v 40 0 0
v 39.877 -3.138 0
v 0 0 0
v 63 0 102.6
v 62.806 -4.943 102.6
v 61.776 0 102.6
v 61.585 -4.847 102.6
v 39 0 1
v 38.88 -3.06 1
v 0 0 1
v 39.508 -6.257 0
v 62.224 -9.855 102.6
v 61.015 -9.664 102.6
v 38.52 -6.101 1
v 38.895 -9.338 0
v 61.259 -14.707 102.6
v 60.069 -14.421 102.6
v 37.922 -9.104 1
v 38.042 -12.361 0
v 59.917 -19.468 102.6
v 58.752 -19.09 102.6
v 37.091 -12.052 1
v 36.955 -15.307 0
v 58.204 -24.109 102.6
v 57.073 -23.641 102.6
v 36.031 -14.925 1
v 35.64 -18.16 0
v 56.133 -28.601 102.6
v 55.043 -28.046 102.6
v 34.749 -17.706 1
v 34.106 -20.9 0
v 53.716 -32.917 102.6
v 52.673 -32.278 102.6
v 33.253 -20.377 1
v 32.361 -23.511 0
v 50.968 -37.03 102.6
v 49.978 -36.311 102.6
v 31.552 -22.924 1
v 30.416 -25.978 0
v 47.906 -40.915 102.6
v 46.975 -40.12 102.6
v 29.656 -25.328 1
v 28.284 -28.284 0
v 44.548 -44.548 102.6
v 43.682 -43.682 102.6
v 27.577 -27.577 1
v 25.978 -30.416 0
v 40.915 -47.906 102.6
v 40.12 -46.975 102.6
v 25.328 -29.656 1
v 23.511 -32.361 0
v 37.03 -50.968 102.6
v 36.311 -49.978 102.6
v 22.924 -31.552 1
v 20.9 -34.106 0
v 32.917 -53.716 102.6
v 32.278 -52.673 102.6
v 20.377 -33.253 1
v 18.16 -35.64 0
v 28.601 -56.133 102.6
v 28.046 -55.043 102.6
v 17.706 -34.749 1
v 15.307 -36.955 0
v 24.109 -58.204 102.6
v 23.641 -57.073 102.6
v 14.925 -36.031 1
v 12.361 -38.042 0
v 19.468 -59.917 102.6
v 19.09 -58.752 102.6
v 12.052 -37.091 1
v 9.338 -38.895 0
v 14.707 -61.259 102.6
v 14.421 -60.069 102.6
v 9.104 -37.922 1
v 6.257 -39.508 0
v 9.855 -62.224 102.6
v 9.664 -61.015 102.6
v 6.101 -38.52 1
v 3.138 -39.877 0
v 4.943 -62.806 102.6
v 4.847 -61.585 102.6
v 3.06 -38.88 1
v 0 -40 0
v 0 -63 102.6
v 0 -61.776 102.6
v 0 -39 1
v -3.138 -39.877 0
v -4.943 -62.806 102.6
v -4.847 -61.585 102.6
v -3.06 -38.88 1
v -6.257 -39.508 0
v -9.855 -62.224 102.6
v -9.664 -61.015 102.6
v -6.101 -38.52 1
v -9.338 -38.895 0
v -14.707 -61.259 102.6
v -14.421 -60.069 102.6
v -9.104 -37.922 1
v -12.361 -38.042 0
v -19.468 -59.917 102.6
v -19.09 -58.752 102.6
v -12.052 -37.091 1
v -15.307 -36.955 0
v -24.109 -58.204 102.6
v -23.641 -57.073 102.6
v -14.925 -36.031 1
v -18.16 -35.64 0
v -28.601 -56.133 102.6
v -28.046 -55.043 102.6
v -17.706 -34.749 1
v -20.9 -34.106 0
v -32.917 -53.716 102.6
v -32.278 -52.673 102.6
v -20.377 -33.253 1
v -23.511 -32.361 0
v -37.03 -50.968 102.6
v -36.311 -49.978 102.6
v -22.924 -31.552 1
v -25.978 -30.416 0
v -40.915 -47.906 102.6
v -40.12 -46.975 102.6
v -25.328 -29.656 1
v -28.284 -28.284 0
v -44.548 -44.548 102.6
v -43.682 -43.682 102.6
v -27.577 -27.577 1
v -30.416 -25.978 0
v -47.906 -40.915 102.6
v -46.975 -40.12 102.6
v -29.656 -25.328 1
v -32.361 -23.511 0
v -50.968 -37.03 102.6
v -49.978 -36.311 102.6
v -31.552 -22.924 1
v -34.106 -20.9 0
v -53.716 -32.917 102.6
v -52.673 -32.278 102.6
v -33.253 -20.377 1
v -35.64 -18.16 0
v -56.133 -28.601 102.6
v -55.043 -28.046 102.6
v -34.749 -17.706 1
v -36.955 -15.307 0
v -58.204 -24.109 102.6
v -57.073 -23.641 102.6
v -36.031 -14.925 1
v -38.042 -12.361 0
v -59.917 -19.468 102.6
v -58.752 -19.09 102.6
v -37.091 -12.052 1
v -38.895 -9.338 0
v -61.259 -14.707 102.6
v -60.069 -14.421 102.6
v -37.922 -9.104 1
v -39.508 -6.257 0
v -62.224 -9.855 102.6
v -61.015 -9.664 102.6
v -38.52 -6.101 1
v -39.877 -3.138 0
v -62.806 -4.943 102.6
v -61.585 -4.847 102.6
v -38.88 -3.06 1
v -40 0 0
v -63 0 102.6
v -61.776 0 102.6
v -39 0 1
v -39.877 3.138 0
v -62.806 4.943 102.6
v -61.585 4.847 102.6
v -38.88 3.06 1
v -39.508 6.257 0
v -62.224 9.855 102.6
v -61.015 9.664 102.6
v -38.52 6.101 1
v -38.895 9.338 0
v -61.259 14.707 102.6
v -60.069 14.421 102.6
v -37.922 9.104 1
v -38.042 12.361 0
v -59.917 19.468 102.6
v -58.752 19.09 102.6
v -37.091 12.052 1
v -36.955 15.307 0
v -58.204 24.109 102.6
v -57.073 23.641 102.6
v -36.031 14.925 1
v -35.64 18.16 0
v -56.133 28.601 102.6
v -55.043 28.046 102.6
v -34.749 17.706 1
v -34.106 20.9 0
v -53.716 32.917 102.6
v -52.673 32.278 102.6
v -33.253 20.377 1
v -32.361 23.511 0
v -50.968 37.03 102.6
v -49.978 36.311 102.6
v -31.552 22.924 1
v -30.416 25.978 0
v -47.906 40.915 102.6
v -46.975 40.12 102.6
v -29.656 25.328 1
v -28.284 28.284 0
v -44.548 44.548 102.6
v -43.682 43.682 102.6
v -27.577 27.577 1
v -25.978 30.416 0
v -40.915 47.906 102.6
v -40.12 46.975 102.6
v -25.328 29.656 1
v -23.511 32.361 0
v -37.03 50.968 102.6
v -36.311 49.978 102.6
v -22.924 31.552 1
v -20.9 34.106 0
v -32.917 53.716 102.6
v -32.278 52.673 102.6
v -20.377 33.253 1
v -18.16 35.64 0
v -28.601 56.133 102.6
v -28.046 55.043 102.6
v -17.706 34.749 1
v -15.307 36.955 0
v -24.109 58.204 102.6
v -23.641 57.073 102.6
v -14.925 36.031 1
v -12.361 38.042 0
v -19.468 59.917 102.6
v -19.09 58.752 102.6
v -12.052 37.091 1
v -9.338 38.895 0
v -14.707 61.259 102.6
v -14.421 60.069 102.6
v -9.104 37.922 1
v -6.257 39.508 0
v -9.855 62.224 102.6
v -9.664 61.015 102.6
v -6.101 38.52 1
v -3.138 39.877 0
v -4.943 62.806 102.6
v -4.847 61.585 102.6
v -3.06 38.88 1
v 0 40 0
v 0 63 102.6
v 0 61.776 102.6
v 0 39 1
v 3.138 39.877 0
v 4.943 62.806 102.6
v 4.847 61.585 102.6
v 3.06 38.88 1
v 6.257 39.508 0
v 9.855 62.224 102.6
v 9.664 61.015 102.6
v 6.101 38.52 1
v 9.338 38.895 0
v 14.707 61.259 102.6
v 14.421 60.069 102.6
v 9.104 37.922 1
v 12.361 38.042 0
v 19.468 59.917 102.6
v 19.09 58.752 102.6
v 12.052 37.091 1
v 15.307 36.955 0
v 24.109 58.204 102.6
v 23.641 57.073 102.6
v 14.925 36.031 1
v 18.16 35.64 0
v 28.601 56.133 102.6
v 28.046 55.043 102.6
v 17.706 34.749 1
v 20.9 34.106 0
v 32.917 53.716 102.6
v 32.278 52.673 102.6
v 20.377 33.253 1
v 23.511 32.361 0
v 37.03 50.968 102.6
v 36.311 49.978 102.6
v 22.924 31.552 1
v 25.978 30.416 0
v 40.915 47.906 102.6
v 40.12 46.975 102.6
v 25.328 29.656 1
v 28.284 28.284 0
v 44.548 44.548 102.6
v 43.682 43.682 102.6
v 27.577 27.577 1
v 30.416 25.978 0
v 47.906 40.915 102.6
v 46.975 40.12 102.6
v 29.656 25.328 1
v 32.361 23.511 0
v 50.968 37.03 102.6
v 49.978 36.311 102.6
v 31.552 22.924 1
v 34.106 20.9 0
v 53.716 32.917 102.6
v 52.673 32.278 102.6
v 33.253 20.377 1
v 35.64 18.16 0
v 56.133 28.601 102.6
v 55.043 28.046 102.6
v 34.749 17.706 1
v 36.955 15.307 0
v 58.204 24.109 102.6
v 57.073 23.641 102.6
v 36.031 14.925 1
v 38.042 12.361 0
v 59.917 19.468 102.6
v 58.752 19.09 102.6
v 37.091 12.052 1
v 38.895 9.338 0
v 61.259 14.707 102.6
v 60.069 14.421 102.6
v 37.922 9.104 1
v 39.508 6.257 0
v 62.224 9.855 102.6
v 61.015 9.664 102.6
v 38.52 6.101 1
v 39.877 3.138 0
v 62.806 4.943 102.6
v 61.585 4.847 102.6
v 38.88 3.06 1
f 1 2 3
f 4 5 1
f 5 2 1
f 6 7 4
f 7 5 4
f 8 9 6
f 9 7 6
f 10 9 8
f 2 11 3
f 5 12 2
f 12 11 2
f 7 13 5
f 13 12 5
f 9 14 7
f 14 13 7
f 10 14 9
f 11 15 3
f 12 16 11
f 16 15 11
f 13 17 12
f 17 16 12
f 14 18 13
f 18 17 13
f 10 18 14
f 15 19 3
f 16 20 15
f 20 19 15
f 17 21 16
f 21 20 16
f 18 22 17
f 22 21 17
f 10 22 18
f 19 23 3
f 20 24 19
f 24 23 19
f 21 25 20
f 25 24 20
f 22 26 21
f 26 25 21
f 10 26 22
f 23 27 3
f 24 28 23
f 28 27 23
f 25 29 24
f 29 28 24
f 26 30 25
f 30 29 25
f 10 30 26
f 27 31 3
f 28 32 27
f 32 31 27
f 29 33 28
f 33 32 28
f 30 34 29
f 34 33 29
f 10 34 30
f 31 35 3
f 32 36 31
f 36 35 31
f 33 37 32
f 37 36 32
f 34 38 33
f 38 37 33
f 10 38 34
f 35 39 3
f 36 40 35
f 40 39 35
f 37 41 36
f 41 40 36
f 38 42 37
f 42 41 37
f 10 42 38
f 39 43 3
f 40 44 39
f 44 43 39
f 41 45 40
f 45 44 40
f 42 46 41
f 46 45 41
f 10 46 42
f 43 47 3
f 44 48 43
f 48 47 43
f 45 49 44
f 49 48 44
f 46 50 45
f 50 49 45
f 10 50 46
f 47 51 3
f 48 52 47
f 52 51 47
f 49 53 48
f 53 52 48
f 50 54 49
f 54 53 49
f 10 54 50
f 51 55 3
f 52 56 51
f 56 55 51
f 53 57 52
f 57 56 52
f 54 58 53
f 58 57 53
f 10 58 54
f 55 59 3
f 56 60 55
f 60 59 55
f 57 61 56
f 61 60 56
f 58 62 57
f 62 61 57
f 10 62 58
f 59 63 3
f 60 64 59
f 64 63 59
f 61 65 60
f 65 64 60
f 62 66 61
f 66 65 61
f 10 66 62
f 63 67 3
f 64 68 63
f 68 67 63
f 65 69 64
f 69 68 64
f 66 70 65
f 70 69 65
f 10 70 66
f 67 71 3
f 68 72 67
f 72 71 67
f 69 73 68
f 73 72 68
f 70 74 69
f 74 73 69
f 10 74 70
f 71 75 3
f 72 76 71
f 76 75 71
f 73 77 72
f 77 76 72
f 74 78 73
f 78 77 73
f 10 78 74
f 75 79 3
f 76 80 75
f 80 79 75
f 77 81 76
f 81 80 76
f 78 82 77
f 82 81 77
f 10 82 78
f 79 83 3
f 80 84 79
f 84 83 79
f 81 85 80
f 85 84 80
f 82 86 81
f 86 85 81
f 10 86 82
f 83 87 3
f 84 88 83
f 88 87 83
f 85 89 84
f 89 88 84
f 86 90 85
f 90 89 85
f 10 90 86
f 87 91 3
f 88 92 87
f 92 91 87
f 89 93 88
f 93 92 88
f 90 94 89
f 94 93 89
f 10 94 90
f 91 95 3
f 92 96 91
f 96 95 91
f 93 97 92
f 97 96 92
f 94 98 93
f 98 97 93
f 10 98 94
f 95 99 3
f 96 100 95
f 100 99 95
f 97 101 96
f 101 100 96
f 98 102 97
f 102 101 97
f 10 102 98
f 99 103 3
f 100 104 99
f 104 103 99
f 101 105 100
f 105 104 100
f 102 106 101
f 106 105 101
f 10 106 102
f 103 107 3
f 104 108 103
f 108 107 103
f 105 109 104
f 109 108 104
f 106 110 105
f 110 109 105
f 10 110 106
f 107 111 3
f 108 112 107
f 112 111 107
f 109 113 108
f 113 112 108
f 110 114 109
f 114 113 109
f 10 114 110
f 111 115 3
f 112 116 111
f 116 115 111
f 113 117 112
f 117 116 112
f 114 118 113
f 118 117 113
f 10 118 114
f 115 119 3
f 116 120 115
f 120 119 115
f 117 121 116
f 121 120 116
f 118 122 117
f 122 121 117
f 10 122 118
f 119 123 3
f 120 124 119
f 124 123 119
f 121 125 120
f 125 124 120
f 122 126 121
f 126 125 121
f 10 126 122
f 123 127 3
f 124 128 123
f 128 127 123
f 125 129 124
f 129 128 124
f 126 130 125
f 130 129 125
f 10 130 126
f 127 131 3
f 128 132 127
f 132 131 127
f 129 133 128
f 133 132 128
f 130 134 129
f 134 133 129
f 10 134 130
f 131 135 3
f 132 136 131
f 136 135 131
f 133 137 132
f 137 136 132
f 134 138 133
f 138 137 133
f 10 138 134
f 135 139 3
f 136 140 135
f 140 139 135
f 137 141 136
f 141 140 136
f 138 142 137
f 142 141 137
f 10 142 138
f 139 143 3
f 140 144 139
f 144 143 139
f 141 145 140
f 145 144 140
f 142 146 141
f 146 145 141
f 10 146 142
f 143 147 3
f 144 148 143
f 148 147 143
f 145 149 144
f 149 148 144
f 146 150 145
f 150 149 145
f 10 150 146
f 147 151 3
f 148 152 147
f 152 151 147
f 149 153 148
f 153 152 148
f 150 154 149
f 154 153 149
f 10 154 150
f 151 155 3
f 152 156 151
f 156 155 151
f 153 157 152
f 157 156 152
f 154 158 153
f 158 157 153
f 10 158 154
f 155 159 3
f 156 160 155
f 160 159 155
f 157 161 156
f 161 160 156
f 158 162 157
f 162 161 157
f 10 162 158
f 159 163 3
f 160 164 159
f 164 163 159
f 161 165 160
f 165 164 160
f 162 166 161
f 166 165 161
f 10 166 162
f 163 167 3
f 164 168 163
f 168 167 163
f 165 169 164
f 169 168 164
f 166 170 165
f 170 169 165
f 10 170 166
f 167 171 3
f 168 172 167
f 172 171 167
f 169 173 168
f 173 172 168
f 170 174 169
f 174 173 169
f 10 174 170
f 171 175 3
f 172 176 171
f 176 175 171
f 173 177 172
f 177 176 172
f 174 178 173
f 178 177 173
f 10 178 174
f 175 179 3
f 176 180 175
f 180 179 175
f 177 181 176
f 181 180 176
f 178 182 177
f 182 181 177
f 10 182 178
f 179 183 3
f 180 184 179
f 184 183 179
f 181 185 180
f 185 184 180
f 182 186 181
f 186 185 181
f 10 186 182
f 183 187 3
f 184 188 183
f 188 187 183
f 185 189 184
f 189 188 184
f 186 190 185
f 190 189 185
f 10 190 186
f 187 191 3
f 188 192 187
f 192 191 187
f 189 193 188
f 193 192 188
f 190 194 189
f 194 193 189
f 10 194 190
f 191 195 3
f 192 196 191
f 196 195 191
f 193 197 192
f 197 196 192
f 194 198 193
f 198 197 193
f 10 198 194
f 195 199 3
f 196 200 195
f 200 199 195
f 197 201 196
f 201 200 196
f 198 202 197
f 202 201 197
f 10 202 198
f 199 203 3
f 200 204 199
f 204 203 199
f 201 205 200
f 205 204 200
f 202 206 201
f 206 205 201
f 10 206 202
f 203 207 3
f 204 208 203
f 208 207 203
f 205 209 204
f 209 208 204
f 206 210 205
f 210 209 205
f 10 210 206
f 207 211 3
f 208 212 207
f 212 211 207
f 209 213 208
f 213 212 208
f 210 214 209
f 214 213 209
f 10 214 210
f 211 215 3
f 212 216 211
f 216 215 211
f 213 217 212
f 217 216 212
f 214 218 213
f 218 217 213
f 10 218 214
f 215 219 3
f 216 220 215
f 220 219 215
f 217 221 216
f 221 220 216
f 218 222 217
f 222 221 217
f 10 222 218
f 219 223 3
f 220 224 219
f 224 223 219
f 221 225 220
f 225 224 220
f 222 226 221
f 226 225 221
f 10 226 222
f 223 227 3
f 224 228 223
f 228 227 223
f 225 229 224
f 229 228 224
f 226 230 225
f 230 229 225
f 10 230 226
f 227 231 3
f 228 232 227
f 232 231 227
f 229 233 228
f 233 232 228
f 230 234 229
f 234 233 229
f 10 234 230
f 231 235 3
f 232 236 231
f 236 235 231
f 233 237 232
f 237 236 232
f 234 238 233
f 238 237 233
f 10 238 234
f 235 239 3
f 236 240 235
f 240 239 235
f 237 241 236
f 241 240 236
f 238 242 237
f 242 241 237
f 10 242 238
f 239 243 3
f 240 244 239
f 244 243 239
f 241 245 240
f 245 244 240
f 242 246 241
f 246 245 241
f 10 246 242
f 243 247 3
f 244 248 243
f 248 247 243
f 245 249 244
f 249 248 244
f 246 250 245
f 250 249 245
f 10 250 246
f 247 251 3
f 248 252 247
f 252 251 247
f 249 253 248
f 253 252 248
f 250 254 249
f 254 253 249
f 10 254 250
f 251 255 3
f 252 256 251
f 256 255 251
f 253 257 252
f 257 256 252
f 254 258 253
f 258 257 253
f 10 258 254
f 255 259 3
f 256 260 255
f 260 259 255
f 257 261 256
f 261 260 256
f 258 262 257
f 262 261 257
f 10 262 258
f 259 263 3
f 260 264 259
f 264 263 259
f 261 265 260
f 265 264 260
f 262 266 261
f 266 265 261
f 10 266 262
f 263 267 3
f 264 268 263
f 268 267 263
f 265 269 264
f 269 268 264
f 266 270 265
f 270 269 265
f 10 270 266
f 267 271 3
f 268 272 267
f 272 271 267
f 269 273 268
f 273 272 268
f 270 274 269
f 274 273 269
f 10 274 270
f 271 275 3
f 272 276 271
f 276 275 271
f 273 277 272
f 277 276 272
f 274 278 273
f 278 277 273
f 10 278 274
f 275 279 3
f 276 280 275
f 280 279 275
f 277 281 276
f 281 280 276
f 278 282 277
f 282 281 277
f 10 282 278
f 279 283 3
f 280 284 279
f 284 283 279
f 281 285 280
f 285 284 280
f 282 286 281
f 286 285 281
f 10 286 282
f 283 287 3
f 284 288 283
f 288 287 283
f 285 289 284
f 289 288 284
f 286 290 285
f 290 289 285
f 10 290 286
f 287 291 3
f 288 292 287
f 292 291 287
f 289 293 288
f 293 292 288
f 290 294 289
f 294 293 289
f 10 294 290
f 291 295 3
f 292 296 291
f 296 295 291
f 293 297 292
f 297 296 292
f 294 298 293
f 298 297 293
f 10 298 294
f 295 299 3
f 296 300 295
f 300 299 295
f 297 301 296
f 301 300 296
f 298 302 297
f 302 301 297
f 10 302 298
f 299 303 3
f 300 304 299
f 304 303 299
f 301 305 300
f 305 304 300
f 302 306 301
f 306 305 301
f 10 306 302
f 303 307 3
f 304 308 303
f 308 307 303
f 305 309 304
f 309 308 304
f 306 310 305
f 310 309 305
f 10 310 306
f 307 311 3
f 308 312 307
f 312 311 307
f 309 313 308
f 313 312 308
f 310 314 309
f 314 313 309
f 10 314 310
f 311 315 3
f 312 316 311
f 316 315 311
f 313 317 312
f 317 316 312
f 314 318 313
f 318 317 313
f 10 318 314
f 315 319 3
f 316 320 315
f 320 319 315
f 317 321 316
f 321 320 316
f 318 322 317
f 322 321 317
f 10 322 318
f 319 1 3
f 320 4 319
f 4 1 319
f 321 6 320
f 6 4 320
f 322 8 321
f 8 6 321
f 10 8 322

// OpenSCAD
$fn=80;

rotate_extrude(angle=360,convexity=10) {
rotate([0,0,90])
difference() {
polygon(points=[[0,0],[0,40],[102.6,63],[102.6,0]])    ;
translate([1,0])
polygon(points=[[0,0],[0,39],[102.6,62],[102.6,0]])    ;
}

}
